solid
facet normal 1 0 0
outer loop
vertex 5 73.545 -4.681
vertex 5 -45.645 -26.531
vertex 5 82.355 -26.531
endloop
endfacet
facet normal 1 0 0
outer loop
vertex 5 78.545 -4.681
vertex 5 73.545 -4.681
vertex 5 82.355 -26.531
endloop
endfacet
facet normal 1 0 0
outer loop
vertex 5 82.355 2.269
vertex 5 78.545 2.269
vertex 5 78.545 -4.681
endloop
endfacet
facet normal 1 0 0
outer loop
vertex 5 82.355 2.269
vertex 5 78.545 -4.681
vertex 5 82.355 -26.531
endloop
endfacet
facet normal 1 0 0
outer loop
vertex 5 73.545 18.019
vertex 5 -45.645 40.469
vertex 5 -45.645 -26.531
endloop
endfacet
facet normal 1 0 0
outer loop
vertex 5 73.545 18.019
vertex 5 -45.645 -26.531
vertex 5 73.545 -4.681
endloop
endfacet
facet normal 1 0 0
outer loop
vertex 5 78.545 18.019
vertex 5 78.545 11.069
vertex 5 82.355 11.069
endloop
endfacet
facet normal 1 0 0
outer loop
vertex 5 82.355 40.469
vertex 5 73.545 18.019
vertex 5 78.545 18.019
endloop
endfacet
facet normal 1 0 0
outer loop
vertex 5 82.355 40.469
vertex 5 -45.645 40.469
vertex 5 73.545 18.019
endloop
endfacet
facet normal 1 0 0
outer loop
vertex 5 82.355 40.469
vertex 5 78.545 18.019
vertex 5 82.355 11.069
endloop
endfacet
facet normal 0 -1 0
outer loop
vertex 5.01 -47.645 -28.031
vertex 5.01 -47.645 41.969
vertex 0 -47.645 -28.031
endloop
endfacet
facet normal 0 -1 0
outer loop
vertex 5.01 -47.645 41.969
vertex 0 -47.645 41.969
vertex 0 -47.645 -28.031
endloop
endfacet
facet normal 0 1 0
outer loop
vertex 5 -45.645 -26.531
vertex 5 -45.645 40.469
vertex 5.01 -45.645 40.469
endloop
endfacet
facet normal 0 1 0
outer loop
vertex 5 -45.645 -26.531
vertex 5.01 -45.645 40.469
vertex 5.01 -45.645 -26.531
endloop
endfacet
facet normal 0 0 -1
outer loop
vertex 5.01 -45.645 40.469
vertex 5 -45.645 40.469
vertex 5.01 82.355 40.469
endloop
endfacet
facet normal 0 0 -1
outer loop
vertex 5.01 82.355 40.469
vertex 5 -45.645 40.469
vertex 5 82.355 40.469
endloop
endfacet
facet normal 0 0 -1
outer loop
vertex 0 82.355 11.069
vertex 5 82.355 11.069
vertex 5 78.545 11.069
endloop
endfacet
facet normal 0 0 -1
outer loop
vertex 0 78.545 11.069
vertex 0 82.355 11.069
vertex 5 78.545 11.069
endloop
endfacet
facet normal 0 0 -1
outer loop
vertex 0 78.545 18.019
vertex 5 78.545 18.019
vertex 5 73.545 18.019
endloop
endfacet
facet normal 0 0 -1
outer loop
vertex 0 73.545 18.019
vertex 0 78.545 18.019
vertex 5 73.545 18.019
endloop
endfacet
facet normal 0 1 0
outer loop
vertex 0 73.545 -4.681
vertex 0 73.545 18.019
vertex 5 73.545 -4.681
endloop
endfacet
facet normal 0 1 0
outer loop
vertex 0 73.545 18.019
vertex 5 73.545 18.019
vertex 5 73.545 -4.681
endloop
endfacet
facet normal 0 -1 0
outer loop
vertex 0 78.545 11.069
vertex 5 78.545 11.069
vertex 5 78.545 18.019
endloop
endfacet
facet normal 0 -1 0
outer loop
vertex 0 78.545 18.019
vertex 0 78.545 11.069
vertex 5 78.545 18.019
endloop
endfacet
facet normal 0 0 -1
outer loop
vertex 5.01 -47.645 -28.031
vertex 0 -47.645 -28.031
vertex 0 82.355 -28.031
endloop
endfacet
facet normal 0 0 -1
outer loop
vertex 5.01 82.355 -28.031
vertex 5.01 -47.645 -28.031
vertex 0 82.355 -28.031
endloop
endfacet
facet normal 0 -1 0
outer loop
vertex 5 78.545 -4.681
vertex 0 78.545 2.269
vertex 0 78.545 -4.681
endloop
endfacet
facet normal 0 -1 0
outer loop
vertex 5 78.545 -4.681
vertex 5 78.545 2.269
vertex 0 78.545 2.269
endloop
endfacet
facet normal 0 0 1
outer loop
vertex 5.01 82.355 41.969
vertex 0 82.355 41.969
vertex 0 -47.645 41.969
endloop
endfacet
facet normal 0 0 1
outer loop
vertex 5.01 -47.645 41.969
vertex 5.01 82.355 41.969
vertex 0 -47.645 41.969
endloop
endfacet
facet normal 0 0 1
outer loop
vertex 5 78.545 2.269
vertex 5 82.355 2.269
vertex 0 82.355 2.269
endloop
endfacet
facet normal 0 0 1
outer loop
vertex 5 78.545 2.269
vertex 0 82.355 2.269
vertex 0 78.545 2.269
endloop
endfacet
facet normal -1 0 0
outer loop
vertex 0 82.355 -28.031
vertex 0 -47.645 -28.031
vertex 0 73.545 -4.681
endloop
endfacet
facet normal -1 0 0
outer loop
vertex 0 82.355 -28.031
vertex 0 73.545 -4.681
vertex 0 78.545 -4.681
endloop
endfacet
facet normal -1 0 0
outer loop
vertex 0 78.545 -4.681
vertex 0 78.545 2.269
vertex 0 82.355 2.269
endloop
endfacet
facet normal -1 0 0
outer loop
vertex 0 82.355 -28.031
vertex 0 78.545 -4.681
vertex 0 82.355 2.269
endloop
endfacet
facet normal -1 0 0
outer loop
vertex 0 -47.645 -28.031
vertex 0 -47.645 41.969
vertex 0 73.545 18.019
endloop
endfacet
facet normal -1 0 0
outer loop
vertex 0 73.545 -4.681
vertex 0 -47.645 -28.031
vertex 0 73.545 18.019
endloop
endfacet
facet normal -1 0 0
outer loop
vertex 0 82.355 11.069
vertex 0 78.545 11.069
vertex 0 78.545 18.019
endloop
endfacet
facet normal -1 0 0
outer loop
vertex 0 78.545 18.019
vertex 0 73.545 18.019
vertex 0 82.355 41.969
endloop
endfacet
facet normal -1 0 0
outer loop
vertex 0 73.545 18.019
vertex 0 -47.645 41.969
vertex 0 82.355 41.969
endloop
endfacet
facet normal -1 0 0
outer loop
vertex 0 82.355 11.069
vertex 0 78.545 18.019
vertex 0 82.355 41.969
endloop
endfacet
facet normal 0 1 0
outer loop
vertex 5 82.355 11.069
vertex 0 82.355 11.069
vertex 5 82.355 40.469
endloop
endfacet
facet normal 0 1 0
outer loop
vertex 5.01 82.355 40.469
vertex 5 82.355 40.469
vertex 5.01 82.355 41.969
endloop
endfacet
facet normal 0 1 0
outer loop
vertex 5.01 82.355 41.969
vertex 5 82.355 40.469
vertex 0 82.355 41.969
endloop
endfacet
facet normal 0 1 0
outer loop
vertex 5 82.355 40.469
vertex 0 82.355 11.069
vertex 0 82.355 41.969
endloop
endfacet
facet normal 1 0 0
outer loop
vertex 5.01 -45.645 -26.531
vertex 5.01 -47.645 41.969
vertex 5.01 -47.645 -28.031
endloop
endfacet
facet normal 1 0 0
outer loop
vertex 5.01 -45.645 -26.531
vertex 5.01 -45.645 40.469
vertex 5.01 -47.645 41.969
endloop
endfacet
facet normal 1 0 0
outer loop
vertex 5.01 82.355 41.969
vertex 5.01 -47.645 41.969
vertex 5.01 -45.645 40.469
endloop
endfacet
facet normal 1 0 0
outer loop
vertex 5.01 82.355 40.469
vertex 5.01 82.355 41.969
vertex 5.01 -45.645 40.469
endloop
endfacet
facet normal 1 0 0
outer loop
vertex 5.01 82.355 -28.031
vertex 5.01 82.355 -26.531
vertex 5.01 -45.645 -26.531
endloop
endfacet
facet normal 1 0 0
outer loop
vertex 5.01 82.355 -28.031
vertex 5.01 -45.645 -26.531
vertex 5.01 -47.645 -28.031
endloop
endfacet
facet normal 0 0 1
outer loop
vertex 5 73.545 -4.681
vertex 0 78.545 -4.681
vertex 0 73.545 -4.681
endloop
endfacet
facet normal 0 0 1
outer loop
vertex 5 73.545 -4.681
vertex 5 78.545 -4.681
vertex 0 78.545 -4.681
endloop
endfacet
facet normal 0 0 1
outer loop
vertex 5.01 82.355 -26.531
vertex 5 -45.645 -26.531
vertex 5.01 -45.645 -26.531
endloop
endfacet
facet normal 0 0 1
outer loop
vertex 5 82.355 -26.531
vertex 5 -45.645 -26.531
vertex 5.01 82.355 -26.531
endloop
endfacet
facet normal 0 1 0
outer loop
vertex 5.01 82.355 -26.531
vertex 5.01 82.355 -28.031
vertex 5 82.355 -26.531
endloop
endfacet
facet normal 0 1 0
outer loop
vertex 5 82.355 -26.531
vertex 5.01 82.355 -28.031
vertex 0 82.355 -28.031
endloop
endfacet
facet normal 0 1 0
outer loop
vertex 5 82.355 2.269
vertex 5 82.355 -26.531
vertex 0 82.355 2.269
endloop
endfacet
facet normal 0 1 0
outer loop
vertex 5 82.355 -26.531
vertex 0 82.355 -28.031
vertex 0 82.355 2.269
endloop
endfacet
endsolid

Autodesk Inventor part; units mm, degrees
ref_plane "YZ Plane" through (0, 0, 0) normal (1, 0, 0) x (0, 1, 0)
ref_plane "XZ Plane" through (0, 0, 0) normal (0, 1, 0) x (-1, 0, 0)
ref_plane "XY Plane" through (0, 0, 0) normal (0, 0, 1) x (1, 0, 0)
sketch "Sketch1" plane through (0, 0, 0) normal (1, 0, 0) x (0, 1, 0)
  line L0 (82.3549, 41.969) -> (-47.6451, 41.969)
  line L1 (-47.6451, 41.969) -> (-47.6451, -28.031)
  line L2 (-47.6451, -28.031) -> (82.3549, -28.031)
  line L3 (82.3549, -28.031) -> (82.3549, 41.969)
  point P0 (0, 0)
  dimension "d0" = 130
  dimension "d1" = 70
extrude "Extrusion1" add sketch "Sketch1" along normal blind 5
sketch "Sketch13" plane through (5, 0, 0) normal (1, 0, 0) x (0, 0, -1)
  line L0 (-41.969, -47.6451) -> (28.031, -47.6451) projected
  line L1 (28.031, 82.3549) -> (-41.969, 82.3549) projected
  line L2 (28.031, -47.6451) -> (26.531, -47.6451)
  line L3 (26.531, -47.6451) -> (26.531, 82.3549)
  line L4 (26.531, 82.3549) -> (28.031, 82.3549)
  line L5 (28.031, 82.3549) -> (28.031, -47.6451)
  line L6 (-41.969, 82.3549) -> (-41.969, -47.6451) projected
  line L7 (28.031, 82.3549) -> (-41.969, 82.3549) projected
  line L8 (-41.969, -47.6451) -> (-40.469, -47.6451)
  line L9 (-40.469, -47.6451) -> (-40.469, 82.3549)
  line L10 (-40.469, 82.3549) -> (-41.969, 82.3549)
  line L11 (-41.969, 82.3549) -> (-41.969, -47.6451)
  line L12 (28.031, -47.6451) -> (-41.969, -47.6451)
  line L13 (-41.969, -47.6451) -> (-41.969, -45.6451)
  line L14 (-41.969, -45.6451) -> (28.031, -45.6451)
  line L15 (28.031, -45.6451) -> (28.031, -47.6451)
  point P0 (0, 0)
  point P1 (10.031, 62.3549)
  point P2 (-5.969, 62.3549)
  point P3 (26.531, -45.6451)
  point P4 (-40.469, -45.6451)
  point P5 (18.031, 62.3549)
  dimension "d42" = 1.5
  dimension "d43" = 1.5
  dimension "d44" = 2
extrude "Extrusion7" add sketch "Sketch13" along normal blind 0.01 contours L6 L14 L9 L0 | L9 L14 L3 L0 | L6 L1 L9 L14 | L3 L14 L5 L0 | L3 L1 L5 L14
sketch "Sketch18" plane through (5, 0, 0) normal (1, 0, 0) x (0, 0, -1)
  line L0 (-10.769, 82.3549) -> (-2.569, 82.3549)
  line L1 (-2.569, 82.3549) -> (-2.2688, 82.3549)
  line L2 (-10.769, 82.3549) -> (-11.069, 82.3549)
  line L3 (-11.069, 82.3549) -> (-11.069, 78.5449)
  line L4 (-2.2688, 82.3549) -> (-2.2688, 78.5449)
  line L5 (-2.2688, 78.5449) -> (4.6812, 78.5449)
  line L6 (-11.069, 78.5449) -> (-18.019, 78.5449)
  line L7 (-18.019, 78.5449) -> (-18.019, 73.5449)
  line L8 (4.6812, 78.5449) -> (4.6812, 73.5449)
  line L9 (-18.019, 73.5449) -> (-7.137, 73.5449)
  line L10 (-7.137, 73.5449) -> (4.6812, 73.5449)
  line L11 (-2.2688, 82.3549) -> (-11.069, 82.3549)
  line L12 (26.531, 82.3549) -> (26.531, -45.6451) projected
  point P0 (0, 0)
  point P1 (4.531, 82.3549)
  point P2 (-3.669, 82.3549)
  point P3 (11.531, 82.3549)
  dimension "d78" = 7.4
  dimension "d79" = 3.81
  dimension "d81" = 3.81
  dimension "d83" = 6.95
  dimension "d85" = 6.95
  dimension "d86" = 5
  dimension "d87" = 5
  dimension "d88" = 8.8002
  dimension "d91" = 11.8183
  dimension "d92" = 10.8819
extrude "Extrusion10" cut sketch "Sketch18" against normal blind 7.9375
properties part number "baseplateinverseproto 1"
